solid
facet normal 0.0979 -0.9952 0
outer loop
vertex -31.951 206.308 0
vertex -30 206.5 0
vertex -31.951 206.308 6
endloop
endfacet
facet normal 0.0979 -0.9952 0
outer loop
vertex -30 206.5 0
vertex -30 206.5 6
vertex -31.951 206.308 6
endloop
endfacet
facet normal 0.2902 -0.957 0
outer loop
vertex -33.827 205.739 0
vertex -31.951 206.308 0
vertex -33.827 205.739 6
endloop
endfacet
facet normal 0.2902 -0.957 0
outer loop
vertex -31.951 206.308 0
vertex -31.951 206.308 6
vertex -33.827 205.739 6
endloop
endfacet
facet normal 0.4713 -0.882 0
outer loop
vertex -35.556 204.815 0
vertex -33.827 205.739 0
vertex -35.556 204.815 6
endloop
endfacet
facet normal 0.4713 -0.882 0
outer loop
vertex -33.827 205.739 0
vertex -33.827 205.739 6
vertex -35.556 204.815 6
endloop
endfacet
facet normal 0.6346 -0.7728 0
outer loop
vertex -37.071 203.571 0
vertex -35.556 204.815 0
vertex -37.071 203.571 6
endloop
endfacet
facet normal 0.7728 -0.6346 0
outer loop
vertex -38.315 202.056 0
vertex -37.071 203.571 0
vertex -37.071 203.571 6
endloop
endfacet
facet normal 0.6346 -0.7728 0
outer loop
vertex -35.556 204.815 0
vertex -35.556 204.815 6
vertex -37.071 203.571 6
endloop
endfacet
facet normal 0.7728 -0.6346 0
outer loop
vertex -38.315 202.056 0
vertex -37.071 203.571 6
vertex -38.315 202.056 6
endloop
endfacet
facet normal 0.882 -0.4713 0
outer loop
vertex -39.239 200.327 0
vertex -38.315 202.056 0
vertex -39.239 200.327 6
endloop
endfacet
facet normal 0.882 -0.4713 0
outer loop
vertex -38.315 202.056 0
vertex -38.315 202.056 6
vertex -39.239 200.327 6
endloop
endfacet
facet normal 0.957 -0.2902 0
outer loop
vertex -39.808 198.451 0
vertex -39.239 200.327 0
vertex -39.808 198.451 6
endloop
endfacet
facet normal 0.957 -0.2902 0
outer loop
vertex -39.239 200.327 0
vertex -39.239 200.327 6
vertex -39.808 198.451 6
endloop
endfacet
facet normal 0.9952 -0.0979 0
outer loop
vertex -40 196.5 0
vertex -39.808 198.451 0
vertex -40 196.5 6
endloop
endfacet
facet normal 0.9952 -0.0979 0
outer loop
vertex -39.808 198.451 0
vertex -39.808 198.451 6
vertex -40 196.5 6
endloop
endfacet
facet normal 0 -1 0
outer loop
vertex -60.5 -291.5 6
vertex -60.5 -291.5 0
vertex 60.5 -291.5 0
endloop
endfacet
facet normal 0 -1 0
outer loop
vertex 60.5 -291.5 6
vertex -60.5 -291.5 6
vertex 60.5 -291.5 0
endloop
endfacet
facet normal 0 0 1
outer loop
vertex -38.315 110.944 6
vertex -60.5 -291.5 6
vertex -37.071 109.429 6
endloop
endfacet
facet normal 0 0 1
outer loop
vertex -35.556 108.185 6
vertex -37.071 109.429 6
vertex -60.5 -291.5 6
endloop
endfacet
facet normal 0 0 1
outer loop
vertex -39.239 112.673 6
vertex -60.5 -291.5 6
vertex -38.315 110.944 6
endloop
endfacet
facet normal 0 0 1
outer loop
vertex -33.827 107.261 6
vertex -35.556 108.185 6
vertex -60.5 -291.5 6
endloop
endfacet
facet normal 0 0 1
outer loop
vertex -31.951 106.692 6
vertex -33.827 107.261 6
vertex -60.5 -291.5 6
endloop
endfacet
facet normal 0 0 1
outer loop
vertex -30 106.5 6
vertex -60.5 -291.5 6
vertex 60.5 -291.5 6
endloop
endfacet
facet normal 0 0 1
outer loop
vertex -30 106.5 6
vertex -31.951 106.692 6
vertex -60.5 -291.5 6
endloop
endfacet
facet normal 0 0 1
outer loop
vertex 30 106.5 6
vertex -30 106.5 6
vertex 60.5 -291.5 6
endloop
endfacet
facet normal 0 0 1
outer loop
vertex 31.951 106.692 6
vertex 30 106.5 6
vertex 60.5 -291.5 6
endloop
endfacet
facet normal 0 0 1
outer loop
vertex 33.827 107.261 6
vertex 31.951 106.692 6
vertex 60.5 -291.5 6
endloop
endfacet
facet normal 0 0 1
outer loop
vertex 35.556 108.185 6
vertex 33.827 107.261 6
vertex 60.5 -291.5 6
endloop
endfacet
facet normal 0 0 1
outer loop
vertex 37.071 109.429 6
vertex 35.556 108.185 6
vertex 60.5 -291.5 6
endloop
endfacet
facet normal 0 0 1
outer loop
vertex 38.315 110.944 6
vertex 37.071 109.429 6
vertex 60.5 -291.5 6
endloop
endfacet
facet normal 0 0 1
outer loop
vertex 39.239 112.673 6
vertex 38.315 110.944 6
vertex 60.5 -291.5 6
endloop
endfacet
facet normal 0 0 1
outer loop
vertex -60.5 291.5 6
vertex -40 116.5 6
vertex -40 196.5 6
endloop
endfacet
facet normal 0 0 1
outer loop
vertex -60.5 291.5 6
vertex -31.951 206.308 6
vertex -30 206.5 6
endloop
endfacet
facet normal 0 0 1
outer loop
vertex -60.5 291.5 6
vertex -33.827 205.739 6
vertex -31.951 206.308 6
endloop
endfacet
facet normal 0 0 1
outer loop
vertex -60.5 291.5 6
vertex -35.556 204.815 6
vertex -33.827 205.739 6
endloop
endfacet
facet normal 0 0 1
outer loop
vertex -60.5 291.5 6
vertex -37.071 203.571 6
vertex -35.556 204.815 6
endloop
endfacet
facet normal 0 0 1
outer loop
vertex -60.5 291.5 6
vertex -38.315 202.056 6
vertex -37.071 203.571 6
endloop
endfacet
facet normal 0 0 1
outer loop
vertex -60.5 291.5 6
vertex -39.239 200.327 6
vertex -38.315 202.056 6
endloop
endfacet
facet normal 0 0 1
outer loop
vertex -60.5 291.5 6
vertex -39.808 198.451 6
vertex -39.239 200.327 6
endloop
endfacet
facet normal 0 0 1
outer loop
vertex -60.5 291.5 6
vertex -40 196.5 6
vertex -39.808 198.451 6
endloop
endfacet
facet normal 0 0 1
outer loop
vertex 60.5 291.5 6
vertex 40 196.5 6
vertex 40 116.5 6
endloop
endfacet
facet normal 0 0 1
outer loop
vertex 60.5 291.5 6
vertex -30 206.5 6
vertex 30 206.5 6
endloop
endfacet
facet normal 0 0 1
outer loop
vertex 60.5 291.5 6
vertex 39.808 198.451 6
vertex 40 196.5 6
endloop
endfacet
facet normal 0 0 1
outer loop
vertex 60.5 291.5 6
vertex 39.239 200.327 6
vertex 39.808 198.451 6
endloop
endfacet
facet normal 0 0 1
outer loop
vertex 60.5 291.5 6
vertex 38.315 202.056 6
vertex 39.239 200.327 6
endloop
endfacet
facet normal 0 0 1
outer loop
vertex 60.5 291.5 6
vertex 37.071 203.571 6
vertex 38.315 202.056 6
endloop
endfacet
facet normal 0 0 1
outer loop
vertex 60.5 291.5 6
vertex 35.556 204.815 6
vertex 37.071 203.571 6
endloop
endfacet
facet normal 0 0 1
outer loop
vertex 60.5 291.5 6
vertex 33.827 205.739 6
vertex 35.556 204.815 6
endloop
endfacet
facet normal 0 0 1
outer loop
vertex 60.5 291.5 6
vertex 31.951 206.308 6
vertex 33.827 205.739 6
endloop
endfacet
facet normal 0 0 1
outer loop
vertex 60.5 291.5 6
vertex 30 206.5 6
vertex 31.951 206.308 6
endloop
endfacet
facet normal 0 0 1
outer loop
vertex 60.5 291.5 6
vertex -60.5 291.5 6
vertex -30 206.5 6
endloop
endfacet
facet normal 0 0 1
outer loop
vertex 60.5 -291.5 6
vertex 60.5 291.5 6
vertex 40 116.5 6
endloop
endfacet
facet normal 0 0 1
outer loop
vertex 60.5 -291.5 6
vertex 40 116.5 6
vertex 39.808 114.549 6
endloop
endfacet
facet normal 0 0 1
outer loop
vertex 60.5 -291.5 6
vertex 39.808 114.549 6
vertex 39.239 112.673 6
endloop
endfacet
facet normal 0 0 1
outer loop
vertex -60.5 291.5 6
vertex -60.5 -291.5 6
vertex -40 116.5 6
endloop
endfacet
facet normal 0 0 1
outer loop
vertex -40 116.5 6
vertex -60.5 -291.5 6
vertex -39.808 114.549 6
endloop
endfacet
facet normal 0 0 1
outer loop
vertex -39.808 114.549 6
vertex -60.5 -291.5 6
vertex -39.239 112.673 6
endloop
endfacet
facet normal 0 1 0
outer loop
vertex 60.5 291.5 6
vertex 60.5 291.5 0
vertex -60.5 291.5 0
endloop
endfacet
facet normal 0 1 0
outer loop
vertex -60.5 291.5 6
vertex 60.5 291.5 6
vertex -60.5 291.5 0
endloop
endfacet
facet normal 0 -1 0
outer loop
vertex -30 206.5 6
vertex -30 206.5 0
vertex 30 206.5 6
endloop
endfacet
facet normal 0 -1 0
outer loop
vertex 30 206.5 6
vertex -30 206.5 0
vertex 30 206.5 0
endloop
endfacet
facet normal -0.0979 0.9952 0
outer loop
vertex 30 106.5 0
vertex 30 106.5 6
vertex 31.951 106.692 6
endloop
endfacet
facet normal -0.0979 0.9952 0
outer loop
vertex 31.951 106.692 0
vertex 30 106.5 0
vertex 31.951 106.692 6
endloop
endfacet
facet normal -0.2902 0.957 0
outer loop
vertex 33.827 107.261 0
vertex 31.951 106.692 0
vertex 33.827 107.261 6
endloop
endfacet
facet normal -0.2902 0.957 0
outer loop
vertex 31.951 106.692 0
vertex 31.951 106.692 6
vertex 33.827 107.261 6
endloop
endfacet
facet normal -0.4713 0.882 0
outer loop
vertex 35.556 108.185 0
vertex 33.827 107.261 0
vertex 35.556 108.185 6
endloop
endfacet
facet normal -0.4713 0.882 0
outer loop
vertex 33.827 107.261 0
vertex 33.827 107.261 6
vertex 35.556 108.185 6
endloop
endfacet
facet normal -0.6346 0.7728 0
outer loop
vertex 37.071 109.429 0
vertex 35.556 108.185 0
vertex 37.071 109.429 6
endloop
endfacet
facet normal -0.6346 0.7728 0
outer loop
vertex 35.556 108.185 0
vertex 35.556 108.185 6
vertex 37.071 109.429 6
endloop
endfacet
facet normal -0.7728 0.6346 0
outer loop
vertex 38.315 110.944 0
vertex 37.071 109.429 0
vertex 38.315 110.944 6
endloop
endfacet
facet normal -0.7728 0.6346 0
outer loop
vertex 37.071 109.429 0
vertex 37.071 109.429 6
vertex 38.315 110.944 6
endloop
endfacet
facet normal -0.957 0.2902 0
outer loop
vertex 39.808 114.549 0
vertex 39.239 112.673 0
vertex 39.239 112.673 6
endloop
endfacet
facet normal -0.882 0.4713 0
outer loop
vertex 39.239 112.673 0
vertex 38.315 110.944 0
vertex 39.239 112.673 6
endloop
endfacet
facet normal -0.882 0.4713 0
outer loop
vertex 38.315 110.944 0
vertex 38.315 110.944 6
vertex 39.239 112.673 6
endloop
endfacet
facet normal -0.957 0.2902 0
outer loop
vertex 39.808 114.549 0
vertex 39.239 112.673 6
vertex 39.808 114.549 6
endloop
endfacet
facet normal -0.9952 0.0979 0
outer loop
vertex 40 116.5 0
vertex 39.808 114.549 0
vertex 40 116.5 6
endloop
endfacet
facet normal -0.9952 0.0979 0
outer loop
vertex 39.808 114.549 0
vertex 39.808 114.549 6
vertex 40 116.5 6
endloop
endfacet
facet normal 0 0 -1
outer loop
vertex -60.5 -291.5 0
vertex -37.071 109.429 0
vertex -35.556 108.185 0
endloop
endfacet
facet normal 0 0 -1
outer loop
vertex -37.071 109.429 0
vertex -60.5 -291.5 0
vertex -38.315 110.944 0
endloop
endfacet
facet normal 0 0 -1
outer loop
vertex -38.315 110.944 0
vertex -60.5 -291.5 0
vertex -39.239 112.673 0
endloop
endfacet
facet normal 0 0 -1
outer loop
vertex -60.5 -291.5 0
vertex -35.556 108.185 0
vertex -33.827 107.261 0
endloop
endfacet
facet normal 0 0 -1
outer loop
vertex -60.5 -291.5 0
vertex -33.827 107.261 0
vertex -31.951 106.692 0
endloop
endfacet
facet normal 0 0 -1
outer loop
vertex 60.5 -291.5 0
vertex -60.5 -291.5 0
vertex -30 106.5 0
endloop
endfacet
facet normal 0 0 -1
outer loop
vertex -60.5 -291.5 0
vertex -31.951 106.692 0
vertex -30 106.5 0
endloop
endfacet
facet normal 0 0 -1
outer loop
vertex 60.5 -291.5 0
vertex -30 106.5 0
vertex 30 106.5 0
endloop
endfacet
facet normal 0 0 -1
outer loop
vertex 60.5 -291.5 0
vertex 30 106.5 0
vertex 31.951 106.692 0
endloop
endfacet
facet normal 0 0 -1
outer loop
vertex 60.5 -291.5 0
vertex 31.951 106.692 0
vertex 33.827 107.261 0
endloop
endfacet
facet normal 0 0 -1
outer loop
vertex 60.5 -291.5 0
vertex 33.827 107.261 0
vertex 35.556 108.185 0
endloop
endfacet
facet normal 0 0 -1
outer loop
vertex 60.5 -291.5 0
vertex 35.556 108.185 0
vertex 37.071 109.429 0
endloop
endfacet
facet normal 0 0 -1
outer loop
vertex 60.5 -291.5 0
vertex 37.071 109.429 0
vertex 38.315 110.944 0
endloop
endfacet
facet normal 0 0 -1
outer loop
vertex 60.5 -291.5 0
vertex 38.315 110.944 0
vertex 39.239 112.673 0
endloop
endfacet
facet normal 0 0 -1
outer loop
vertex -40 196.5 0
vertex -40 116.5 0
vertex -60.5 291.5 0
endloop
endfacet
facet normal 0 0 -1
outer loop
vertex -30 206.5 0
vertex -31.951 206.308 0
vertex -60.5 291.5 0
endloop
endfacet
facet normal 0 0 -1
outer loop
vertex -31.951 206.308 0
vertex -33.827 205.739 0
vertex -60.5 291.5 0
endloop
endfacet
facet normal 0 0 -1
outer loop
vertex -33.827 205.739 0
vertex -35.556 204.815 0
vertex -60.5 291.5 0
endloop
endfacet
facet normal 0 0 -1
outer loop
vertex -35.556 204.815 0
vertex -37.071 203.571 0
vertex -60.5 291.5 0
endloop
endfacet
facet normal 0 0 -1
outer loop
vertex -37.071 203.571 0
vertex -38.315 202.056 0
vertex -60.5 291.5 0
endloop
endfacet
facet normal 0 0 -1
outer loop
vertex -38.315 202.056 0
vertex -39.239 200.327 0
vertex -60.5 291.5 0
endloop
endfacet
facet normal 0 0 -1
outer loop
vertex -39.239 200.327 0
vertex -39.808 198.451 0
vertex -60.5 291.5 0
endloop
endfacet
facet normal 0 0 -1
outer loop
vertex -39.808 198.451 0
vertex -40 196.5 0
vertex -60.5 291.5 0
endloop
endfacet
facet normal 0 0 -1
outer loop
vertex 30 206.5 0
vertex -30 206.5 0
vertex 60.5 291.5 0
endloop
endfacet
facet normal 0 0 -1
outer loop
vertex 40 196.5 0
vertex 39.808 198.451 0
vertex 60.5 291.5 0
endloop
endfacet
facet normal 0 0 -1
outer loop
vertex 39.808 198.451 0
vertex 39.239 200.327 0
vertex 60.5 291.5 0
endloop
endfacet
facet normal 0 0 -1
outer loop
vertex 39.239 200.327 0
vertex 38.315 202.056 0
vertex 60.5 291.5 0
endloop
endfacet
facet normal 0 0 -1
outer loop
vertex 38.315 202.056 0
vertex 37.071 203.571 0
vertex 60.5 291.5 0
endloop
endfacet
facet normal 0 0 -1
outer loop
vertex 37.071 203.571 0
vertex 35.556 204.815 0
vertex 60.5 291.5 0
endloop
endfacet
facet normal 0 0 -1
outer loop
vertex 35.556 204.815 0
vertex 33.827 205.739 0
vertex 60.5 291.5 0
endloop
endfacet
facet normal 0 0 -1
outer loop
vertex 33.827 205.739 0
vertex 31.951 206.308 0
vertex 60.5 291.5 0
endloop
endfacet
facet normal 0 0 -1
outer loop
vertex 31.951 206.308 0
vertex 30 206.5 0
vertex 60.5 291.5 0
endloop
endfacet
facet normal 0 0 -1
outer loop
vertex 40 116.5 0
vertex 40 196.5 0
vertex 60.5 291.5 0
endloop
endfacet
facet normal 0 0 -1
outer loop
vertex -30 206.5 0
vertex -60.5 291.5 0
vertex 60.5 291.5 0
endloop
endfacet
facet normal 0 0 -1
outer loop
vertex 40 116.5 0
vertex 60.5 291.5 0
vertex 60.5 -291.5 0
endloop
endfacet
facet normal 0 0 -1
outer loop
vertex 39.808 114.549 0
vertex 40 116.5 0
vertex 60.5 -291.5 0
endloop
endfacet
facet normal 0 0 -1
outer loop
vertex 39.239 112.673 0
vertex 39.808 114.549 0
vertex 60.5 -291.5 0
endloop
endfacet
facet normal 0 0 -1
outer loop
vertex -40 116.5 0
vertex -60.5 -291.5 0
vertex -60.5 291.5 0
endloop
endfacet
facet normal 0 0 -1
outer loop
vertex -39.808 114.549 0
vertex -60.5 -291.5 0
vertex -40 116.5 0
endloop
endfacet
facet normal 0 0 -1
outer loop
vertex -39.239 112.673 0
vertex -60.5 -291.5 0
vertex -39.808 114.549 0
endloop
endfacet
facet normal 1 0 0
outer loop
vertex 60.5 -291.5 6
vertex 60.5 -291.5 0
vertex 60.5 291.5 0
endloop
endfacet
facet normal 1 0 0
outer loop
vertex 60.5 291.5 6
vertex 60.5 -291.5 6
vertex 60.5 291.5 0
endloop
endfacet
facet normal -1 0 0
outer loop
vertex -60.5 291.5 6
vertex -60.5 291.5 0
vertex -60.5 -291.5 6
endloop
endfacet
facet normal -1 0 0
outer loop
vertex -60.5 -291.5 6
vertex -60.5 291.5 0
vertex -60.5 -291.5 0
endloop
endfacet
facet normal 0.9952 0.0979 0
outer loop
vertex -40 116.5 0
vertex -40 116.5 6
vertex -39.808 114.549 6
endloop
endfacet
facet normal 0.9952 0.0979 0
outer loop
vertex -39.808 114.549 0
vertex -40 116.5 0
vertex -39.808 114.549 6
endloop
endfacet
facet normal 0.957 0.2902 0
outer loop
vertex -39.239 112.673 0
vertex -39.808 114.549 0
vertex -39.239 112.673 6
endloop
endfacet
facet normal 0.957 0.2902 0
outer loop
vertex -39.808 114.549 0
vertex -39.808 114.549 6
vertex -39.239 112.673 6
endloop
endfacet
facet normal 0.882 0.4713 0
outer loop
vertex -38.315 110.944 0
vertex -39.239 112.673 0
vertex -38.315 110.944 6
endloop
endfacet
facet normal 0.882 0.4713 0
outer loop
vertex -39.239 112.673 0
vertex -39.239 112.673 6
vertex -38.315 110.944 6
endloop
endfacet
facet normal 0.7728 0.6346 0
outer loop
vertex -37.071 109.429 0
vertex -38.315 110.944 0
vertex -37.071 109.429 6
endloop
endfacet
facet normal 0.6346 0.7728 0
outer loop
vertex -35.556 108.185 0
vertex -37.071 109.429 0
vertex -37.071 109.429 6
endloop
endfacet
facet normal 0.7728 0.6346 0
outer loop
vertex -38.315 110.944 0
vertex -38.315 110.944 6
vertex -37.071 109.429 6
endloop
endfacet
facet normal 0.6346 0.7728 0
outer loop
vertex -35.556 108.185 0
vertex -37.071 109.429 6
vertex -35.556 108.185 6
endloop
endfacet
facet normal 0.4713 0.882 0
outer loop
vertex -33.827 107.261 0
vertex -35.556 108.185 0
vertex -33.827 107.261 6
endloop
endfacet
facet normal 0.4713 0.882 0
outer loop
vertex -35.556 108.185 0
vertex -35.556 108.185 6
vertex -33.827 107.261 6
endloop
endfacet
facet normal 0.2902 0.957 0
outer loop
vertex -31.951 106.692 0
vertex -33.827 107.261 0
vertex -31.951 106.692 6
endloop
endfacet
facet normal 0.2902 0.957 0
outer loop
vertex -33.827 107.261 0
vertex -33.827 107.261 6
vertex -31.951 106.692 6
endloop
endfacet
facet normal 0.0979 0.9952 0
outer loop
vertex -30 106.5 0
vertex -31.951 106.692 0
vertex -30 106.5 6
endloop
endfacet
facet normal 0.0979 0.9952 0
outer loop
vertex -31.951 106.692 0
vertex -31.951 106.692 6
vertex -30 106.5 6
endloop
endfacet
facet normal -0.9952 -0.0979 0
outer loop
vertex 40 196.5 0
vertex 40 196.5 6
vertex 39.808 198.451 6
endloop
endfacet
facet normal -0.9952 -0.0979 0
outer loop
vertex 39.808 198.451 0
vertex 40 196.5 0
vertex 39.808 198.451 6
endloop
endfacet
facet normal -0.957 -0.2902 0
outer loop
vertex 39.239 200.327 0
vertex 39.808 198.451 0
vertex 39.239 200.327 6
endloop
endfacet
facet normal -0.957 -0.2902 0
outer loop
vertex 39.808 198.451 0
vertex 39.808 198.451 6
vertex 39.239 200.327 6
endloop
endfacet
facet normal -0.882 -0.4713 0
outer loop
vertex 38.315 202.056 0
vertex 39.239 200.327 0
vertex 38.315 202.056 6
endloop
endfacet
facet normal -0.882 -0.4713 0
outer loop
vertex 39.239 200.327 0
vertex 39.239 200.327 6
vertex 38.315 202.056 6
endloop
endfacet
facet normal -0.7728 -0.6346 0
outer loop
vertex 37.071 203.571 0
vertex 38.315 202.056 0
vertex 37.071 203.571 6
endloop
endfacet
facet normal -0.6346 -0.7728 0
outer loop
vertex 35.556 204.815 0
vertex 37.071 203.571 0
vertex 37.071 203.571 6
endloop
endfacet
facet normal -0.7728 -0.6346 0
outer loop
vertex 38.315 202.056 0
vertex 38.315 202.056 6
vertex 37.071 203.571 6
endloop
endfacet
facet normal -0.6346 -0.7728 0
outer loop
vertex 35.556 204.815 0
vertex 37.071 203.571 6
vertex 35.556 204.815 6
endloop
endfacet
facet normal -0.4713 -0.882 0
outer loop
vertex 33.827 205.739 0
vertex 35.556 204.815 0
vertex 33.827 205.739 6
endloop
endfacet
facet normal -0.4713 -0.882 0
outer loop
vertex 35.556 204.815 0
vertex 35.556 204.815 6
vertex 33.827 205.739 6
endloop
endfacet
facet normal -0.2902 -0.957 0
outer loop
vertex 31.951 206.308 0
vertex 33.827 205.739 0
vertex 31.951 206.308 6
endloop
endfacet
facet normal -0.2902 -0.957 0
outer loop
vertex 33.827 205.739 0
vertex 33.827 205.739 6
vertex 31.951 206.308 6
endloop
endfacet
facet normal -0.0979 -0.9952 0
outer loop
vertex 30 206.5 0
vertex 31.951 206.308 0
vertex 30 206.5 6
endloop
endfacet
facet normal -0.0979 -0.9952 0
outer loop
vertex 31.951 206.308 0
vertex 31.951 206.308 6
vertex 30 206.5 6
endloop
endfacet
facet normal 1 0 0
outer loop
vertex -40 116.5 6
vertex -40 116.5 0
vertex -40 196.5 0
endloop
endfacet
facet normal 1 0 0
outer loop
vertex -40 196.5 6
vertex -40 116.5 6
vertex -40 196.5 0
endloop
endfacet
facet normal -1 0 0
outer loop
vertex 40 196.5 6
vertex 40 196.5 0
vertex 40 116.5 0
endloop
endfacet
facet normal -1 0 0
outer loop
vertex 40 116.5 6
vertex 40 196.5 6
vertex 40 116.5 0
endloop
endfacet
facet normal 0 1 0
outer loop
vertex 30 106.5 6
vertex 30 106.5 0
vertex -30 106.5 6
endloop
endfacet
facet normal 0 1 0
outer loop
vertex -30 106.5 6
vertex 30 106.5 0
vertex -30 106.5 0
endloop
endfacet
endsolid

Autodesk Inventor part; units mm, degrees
ref_plane "YZ Plane" through (0, 0, 0) normal (1, 0, 0) x (0, 1, 0)
ref_plane "XZ Plane" through (0, 0, 0) normal (0, 1, 0) x (-1, 0, 0)
ref_plane "XY Plane" through (0, 0, 0) normal (0, 0, 1) x (1, 0, 0)
sketch "Skizze1" plane through (0, 0, 0) normal (0, 0, 1) x (1, 0, 0)
  line L0 (0, 408.1) -> (0, -408.1) projected
  line L1 (-84.7, 0) -> (84.7, 0) projected
  line L2 (-60.5, -291.5) -> (60.5, -291.5)
  line L3 (60.5, -291.5) -> (60.5, 291.5)
  line L4 (60.5, 291.5) -> (-60.5, 291.5)
  line L5 (-60.5, 291.5) -> (-60.5, -291.5)
  point P0 (0, 0)
  point P1 (0, -291.5)
  point P2 (-60.5, 0)
  dimension "d0" = 583
  dimension "d1" = 121
extrude "Extrusion1" add sketch "Skizze1" along normal blind 6
sketch "Skizze2" plane through (0, 0, 0) normal (0, 0, -1) x (-1, 0, 0)
  line L0 (60.5, 291.5) -> (60.5, -291.5) projected
  line L1 (-60.5, 291.5) -> (60.5, 291.5) projected
  line L2 (-40, 106.5) -> (40, 106.5)
  line L3 (40, 106.5) -> (40, 206.5)
  line L4 (40, 206.5) -> (-40, 206.5)
  line L5 (-40, 206.5) -> (-40, 106.5)
  line L6 (50, 227.269) -> (50, 127.269) projected
  point P0 (0, 0)
  dimension "d4" = 185
  dimension "d5" = 100
  dimension "d6" = 80
  dimension "d7" = 20.5
extrude "Extrusion2" cut sketch "Skizze2" against normal through all
fillet "Rundung1" radius 10 4 edges at (-40, 106.5, 3) (-40, 206.5, 3) (40, 206.5, 3) (40, 106.5, 3)
properties part number "Schläuse" material "Polycarbonate, Clear"
